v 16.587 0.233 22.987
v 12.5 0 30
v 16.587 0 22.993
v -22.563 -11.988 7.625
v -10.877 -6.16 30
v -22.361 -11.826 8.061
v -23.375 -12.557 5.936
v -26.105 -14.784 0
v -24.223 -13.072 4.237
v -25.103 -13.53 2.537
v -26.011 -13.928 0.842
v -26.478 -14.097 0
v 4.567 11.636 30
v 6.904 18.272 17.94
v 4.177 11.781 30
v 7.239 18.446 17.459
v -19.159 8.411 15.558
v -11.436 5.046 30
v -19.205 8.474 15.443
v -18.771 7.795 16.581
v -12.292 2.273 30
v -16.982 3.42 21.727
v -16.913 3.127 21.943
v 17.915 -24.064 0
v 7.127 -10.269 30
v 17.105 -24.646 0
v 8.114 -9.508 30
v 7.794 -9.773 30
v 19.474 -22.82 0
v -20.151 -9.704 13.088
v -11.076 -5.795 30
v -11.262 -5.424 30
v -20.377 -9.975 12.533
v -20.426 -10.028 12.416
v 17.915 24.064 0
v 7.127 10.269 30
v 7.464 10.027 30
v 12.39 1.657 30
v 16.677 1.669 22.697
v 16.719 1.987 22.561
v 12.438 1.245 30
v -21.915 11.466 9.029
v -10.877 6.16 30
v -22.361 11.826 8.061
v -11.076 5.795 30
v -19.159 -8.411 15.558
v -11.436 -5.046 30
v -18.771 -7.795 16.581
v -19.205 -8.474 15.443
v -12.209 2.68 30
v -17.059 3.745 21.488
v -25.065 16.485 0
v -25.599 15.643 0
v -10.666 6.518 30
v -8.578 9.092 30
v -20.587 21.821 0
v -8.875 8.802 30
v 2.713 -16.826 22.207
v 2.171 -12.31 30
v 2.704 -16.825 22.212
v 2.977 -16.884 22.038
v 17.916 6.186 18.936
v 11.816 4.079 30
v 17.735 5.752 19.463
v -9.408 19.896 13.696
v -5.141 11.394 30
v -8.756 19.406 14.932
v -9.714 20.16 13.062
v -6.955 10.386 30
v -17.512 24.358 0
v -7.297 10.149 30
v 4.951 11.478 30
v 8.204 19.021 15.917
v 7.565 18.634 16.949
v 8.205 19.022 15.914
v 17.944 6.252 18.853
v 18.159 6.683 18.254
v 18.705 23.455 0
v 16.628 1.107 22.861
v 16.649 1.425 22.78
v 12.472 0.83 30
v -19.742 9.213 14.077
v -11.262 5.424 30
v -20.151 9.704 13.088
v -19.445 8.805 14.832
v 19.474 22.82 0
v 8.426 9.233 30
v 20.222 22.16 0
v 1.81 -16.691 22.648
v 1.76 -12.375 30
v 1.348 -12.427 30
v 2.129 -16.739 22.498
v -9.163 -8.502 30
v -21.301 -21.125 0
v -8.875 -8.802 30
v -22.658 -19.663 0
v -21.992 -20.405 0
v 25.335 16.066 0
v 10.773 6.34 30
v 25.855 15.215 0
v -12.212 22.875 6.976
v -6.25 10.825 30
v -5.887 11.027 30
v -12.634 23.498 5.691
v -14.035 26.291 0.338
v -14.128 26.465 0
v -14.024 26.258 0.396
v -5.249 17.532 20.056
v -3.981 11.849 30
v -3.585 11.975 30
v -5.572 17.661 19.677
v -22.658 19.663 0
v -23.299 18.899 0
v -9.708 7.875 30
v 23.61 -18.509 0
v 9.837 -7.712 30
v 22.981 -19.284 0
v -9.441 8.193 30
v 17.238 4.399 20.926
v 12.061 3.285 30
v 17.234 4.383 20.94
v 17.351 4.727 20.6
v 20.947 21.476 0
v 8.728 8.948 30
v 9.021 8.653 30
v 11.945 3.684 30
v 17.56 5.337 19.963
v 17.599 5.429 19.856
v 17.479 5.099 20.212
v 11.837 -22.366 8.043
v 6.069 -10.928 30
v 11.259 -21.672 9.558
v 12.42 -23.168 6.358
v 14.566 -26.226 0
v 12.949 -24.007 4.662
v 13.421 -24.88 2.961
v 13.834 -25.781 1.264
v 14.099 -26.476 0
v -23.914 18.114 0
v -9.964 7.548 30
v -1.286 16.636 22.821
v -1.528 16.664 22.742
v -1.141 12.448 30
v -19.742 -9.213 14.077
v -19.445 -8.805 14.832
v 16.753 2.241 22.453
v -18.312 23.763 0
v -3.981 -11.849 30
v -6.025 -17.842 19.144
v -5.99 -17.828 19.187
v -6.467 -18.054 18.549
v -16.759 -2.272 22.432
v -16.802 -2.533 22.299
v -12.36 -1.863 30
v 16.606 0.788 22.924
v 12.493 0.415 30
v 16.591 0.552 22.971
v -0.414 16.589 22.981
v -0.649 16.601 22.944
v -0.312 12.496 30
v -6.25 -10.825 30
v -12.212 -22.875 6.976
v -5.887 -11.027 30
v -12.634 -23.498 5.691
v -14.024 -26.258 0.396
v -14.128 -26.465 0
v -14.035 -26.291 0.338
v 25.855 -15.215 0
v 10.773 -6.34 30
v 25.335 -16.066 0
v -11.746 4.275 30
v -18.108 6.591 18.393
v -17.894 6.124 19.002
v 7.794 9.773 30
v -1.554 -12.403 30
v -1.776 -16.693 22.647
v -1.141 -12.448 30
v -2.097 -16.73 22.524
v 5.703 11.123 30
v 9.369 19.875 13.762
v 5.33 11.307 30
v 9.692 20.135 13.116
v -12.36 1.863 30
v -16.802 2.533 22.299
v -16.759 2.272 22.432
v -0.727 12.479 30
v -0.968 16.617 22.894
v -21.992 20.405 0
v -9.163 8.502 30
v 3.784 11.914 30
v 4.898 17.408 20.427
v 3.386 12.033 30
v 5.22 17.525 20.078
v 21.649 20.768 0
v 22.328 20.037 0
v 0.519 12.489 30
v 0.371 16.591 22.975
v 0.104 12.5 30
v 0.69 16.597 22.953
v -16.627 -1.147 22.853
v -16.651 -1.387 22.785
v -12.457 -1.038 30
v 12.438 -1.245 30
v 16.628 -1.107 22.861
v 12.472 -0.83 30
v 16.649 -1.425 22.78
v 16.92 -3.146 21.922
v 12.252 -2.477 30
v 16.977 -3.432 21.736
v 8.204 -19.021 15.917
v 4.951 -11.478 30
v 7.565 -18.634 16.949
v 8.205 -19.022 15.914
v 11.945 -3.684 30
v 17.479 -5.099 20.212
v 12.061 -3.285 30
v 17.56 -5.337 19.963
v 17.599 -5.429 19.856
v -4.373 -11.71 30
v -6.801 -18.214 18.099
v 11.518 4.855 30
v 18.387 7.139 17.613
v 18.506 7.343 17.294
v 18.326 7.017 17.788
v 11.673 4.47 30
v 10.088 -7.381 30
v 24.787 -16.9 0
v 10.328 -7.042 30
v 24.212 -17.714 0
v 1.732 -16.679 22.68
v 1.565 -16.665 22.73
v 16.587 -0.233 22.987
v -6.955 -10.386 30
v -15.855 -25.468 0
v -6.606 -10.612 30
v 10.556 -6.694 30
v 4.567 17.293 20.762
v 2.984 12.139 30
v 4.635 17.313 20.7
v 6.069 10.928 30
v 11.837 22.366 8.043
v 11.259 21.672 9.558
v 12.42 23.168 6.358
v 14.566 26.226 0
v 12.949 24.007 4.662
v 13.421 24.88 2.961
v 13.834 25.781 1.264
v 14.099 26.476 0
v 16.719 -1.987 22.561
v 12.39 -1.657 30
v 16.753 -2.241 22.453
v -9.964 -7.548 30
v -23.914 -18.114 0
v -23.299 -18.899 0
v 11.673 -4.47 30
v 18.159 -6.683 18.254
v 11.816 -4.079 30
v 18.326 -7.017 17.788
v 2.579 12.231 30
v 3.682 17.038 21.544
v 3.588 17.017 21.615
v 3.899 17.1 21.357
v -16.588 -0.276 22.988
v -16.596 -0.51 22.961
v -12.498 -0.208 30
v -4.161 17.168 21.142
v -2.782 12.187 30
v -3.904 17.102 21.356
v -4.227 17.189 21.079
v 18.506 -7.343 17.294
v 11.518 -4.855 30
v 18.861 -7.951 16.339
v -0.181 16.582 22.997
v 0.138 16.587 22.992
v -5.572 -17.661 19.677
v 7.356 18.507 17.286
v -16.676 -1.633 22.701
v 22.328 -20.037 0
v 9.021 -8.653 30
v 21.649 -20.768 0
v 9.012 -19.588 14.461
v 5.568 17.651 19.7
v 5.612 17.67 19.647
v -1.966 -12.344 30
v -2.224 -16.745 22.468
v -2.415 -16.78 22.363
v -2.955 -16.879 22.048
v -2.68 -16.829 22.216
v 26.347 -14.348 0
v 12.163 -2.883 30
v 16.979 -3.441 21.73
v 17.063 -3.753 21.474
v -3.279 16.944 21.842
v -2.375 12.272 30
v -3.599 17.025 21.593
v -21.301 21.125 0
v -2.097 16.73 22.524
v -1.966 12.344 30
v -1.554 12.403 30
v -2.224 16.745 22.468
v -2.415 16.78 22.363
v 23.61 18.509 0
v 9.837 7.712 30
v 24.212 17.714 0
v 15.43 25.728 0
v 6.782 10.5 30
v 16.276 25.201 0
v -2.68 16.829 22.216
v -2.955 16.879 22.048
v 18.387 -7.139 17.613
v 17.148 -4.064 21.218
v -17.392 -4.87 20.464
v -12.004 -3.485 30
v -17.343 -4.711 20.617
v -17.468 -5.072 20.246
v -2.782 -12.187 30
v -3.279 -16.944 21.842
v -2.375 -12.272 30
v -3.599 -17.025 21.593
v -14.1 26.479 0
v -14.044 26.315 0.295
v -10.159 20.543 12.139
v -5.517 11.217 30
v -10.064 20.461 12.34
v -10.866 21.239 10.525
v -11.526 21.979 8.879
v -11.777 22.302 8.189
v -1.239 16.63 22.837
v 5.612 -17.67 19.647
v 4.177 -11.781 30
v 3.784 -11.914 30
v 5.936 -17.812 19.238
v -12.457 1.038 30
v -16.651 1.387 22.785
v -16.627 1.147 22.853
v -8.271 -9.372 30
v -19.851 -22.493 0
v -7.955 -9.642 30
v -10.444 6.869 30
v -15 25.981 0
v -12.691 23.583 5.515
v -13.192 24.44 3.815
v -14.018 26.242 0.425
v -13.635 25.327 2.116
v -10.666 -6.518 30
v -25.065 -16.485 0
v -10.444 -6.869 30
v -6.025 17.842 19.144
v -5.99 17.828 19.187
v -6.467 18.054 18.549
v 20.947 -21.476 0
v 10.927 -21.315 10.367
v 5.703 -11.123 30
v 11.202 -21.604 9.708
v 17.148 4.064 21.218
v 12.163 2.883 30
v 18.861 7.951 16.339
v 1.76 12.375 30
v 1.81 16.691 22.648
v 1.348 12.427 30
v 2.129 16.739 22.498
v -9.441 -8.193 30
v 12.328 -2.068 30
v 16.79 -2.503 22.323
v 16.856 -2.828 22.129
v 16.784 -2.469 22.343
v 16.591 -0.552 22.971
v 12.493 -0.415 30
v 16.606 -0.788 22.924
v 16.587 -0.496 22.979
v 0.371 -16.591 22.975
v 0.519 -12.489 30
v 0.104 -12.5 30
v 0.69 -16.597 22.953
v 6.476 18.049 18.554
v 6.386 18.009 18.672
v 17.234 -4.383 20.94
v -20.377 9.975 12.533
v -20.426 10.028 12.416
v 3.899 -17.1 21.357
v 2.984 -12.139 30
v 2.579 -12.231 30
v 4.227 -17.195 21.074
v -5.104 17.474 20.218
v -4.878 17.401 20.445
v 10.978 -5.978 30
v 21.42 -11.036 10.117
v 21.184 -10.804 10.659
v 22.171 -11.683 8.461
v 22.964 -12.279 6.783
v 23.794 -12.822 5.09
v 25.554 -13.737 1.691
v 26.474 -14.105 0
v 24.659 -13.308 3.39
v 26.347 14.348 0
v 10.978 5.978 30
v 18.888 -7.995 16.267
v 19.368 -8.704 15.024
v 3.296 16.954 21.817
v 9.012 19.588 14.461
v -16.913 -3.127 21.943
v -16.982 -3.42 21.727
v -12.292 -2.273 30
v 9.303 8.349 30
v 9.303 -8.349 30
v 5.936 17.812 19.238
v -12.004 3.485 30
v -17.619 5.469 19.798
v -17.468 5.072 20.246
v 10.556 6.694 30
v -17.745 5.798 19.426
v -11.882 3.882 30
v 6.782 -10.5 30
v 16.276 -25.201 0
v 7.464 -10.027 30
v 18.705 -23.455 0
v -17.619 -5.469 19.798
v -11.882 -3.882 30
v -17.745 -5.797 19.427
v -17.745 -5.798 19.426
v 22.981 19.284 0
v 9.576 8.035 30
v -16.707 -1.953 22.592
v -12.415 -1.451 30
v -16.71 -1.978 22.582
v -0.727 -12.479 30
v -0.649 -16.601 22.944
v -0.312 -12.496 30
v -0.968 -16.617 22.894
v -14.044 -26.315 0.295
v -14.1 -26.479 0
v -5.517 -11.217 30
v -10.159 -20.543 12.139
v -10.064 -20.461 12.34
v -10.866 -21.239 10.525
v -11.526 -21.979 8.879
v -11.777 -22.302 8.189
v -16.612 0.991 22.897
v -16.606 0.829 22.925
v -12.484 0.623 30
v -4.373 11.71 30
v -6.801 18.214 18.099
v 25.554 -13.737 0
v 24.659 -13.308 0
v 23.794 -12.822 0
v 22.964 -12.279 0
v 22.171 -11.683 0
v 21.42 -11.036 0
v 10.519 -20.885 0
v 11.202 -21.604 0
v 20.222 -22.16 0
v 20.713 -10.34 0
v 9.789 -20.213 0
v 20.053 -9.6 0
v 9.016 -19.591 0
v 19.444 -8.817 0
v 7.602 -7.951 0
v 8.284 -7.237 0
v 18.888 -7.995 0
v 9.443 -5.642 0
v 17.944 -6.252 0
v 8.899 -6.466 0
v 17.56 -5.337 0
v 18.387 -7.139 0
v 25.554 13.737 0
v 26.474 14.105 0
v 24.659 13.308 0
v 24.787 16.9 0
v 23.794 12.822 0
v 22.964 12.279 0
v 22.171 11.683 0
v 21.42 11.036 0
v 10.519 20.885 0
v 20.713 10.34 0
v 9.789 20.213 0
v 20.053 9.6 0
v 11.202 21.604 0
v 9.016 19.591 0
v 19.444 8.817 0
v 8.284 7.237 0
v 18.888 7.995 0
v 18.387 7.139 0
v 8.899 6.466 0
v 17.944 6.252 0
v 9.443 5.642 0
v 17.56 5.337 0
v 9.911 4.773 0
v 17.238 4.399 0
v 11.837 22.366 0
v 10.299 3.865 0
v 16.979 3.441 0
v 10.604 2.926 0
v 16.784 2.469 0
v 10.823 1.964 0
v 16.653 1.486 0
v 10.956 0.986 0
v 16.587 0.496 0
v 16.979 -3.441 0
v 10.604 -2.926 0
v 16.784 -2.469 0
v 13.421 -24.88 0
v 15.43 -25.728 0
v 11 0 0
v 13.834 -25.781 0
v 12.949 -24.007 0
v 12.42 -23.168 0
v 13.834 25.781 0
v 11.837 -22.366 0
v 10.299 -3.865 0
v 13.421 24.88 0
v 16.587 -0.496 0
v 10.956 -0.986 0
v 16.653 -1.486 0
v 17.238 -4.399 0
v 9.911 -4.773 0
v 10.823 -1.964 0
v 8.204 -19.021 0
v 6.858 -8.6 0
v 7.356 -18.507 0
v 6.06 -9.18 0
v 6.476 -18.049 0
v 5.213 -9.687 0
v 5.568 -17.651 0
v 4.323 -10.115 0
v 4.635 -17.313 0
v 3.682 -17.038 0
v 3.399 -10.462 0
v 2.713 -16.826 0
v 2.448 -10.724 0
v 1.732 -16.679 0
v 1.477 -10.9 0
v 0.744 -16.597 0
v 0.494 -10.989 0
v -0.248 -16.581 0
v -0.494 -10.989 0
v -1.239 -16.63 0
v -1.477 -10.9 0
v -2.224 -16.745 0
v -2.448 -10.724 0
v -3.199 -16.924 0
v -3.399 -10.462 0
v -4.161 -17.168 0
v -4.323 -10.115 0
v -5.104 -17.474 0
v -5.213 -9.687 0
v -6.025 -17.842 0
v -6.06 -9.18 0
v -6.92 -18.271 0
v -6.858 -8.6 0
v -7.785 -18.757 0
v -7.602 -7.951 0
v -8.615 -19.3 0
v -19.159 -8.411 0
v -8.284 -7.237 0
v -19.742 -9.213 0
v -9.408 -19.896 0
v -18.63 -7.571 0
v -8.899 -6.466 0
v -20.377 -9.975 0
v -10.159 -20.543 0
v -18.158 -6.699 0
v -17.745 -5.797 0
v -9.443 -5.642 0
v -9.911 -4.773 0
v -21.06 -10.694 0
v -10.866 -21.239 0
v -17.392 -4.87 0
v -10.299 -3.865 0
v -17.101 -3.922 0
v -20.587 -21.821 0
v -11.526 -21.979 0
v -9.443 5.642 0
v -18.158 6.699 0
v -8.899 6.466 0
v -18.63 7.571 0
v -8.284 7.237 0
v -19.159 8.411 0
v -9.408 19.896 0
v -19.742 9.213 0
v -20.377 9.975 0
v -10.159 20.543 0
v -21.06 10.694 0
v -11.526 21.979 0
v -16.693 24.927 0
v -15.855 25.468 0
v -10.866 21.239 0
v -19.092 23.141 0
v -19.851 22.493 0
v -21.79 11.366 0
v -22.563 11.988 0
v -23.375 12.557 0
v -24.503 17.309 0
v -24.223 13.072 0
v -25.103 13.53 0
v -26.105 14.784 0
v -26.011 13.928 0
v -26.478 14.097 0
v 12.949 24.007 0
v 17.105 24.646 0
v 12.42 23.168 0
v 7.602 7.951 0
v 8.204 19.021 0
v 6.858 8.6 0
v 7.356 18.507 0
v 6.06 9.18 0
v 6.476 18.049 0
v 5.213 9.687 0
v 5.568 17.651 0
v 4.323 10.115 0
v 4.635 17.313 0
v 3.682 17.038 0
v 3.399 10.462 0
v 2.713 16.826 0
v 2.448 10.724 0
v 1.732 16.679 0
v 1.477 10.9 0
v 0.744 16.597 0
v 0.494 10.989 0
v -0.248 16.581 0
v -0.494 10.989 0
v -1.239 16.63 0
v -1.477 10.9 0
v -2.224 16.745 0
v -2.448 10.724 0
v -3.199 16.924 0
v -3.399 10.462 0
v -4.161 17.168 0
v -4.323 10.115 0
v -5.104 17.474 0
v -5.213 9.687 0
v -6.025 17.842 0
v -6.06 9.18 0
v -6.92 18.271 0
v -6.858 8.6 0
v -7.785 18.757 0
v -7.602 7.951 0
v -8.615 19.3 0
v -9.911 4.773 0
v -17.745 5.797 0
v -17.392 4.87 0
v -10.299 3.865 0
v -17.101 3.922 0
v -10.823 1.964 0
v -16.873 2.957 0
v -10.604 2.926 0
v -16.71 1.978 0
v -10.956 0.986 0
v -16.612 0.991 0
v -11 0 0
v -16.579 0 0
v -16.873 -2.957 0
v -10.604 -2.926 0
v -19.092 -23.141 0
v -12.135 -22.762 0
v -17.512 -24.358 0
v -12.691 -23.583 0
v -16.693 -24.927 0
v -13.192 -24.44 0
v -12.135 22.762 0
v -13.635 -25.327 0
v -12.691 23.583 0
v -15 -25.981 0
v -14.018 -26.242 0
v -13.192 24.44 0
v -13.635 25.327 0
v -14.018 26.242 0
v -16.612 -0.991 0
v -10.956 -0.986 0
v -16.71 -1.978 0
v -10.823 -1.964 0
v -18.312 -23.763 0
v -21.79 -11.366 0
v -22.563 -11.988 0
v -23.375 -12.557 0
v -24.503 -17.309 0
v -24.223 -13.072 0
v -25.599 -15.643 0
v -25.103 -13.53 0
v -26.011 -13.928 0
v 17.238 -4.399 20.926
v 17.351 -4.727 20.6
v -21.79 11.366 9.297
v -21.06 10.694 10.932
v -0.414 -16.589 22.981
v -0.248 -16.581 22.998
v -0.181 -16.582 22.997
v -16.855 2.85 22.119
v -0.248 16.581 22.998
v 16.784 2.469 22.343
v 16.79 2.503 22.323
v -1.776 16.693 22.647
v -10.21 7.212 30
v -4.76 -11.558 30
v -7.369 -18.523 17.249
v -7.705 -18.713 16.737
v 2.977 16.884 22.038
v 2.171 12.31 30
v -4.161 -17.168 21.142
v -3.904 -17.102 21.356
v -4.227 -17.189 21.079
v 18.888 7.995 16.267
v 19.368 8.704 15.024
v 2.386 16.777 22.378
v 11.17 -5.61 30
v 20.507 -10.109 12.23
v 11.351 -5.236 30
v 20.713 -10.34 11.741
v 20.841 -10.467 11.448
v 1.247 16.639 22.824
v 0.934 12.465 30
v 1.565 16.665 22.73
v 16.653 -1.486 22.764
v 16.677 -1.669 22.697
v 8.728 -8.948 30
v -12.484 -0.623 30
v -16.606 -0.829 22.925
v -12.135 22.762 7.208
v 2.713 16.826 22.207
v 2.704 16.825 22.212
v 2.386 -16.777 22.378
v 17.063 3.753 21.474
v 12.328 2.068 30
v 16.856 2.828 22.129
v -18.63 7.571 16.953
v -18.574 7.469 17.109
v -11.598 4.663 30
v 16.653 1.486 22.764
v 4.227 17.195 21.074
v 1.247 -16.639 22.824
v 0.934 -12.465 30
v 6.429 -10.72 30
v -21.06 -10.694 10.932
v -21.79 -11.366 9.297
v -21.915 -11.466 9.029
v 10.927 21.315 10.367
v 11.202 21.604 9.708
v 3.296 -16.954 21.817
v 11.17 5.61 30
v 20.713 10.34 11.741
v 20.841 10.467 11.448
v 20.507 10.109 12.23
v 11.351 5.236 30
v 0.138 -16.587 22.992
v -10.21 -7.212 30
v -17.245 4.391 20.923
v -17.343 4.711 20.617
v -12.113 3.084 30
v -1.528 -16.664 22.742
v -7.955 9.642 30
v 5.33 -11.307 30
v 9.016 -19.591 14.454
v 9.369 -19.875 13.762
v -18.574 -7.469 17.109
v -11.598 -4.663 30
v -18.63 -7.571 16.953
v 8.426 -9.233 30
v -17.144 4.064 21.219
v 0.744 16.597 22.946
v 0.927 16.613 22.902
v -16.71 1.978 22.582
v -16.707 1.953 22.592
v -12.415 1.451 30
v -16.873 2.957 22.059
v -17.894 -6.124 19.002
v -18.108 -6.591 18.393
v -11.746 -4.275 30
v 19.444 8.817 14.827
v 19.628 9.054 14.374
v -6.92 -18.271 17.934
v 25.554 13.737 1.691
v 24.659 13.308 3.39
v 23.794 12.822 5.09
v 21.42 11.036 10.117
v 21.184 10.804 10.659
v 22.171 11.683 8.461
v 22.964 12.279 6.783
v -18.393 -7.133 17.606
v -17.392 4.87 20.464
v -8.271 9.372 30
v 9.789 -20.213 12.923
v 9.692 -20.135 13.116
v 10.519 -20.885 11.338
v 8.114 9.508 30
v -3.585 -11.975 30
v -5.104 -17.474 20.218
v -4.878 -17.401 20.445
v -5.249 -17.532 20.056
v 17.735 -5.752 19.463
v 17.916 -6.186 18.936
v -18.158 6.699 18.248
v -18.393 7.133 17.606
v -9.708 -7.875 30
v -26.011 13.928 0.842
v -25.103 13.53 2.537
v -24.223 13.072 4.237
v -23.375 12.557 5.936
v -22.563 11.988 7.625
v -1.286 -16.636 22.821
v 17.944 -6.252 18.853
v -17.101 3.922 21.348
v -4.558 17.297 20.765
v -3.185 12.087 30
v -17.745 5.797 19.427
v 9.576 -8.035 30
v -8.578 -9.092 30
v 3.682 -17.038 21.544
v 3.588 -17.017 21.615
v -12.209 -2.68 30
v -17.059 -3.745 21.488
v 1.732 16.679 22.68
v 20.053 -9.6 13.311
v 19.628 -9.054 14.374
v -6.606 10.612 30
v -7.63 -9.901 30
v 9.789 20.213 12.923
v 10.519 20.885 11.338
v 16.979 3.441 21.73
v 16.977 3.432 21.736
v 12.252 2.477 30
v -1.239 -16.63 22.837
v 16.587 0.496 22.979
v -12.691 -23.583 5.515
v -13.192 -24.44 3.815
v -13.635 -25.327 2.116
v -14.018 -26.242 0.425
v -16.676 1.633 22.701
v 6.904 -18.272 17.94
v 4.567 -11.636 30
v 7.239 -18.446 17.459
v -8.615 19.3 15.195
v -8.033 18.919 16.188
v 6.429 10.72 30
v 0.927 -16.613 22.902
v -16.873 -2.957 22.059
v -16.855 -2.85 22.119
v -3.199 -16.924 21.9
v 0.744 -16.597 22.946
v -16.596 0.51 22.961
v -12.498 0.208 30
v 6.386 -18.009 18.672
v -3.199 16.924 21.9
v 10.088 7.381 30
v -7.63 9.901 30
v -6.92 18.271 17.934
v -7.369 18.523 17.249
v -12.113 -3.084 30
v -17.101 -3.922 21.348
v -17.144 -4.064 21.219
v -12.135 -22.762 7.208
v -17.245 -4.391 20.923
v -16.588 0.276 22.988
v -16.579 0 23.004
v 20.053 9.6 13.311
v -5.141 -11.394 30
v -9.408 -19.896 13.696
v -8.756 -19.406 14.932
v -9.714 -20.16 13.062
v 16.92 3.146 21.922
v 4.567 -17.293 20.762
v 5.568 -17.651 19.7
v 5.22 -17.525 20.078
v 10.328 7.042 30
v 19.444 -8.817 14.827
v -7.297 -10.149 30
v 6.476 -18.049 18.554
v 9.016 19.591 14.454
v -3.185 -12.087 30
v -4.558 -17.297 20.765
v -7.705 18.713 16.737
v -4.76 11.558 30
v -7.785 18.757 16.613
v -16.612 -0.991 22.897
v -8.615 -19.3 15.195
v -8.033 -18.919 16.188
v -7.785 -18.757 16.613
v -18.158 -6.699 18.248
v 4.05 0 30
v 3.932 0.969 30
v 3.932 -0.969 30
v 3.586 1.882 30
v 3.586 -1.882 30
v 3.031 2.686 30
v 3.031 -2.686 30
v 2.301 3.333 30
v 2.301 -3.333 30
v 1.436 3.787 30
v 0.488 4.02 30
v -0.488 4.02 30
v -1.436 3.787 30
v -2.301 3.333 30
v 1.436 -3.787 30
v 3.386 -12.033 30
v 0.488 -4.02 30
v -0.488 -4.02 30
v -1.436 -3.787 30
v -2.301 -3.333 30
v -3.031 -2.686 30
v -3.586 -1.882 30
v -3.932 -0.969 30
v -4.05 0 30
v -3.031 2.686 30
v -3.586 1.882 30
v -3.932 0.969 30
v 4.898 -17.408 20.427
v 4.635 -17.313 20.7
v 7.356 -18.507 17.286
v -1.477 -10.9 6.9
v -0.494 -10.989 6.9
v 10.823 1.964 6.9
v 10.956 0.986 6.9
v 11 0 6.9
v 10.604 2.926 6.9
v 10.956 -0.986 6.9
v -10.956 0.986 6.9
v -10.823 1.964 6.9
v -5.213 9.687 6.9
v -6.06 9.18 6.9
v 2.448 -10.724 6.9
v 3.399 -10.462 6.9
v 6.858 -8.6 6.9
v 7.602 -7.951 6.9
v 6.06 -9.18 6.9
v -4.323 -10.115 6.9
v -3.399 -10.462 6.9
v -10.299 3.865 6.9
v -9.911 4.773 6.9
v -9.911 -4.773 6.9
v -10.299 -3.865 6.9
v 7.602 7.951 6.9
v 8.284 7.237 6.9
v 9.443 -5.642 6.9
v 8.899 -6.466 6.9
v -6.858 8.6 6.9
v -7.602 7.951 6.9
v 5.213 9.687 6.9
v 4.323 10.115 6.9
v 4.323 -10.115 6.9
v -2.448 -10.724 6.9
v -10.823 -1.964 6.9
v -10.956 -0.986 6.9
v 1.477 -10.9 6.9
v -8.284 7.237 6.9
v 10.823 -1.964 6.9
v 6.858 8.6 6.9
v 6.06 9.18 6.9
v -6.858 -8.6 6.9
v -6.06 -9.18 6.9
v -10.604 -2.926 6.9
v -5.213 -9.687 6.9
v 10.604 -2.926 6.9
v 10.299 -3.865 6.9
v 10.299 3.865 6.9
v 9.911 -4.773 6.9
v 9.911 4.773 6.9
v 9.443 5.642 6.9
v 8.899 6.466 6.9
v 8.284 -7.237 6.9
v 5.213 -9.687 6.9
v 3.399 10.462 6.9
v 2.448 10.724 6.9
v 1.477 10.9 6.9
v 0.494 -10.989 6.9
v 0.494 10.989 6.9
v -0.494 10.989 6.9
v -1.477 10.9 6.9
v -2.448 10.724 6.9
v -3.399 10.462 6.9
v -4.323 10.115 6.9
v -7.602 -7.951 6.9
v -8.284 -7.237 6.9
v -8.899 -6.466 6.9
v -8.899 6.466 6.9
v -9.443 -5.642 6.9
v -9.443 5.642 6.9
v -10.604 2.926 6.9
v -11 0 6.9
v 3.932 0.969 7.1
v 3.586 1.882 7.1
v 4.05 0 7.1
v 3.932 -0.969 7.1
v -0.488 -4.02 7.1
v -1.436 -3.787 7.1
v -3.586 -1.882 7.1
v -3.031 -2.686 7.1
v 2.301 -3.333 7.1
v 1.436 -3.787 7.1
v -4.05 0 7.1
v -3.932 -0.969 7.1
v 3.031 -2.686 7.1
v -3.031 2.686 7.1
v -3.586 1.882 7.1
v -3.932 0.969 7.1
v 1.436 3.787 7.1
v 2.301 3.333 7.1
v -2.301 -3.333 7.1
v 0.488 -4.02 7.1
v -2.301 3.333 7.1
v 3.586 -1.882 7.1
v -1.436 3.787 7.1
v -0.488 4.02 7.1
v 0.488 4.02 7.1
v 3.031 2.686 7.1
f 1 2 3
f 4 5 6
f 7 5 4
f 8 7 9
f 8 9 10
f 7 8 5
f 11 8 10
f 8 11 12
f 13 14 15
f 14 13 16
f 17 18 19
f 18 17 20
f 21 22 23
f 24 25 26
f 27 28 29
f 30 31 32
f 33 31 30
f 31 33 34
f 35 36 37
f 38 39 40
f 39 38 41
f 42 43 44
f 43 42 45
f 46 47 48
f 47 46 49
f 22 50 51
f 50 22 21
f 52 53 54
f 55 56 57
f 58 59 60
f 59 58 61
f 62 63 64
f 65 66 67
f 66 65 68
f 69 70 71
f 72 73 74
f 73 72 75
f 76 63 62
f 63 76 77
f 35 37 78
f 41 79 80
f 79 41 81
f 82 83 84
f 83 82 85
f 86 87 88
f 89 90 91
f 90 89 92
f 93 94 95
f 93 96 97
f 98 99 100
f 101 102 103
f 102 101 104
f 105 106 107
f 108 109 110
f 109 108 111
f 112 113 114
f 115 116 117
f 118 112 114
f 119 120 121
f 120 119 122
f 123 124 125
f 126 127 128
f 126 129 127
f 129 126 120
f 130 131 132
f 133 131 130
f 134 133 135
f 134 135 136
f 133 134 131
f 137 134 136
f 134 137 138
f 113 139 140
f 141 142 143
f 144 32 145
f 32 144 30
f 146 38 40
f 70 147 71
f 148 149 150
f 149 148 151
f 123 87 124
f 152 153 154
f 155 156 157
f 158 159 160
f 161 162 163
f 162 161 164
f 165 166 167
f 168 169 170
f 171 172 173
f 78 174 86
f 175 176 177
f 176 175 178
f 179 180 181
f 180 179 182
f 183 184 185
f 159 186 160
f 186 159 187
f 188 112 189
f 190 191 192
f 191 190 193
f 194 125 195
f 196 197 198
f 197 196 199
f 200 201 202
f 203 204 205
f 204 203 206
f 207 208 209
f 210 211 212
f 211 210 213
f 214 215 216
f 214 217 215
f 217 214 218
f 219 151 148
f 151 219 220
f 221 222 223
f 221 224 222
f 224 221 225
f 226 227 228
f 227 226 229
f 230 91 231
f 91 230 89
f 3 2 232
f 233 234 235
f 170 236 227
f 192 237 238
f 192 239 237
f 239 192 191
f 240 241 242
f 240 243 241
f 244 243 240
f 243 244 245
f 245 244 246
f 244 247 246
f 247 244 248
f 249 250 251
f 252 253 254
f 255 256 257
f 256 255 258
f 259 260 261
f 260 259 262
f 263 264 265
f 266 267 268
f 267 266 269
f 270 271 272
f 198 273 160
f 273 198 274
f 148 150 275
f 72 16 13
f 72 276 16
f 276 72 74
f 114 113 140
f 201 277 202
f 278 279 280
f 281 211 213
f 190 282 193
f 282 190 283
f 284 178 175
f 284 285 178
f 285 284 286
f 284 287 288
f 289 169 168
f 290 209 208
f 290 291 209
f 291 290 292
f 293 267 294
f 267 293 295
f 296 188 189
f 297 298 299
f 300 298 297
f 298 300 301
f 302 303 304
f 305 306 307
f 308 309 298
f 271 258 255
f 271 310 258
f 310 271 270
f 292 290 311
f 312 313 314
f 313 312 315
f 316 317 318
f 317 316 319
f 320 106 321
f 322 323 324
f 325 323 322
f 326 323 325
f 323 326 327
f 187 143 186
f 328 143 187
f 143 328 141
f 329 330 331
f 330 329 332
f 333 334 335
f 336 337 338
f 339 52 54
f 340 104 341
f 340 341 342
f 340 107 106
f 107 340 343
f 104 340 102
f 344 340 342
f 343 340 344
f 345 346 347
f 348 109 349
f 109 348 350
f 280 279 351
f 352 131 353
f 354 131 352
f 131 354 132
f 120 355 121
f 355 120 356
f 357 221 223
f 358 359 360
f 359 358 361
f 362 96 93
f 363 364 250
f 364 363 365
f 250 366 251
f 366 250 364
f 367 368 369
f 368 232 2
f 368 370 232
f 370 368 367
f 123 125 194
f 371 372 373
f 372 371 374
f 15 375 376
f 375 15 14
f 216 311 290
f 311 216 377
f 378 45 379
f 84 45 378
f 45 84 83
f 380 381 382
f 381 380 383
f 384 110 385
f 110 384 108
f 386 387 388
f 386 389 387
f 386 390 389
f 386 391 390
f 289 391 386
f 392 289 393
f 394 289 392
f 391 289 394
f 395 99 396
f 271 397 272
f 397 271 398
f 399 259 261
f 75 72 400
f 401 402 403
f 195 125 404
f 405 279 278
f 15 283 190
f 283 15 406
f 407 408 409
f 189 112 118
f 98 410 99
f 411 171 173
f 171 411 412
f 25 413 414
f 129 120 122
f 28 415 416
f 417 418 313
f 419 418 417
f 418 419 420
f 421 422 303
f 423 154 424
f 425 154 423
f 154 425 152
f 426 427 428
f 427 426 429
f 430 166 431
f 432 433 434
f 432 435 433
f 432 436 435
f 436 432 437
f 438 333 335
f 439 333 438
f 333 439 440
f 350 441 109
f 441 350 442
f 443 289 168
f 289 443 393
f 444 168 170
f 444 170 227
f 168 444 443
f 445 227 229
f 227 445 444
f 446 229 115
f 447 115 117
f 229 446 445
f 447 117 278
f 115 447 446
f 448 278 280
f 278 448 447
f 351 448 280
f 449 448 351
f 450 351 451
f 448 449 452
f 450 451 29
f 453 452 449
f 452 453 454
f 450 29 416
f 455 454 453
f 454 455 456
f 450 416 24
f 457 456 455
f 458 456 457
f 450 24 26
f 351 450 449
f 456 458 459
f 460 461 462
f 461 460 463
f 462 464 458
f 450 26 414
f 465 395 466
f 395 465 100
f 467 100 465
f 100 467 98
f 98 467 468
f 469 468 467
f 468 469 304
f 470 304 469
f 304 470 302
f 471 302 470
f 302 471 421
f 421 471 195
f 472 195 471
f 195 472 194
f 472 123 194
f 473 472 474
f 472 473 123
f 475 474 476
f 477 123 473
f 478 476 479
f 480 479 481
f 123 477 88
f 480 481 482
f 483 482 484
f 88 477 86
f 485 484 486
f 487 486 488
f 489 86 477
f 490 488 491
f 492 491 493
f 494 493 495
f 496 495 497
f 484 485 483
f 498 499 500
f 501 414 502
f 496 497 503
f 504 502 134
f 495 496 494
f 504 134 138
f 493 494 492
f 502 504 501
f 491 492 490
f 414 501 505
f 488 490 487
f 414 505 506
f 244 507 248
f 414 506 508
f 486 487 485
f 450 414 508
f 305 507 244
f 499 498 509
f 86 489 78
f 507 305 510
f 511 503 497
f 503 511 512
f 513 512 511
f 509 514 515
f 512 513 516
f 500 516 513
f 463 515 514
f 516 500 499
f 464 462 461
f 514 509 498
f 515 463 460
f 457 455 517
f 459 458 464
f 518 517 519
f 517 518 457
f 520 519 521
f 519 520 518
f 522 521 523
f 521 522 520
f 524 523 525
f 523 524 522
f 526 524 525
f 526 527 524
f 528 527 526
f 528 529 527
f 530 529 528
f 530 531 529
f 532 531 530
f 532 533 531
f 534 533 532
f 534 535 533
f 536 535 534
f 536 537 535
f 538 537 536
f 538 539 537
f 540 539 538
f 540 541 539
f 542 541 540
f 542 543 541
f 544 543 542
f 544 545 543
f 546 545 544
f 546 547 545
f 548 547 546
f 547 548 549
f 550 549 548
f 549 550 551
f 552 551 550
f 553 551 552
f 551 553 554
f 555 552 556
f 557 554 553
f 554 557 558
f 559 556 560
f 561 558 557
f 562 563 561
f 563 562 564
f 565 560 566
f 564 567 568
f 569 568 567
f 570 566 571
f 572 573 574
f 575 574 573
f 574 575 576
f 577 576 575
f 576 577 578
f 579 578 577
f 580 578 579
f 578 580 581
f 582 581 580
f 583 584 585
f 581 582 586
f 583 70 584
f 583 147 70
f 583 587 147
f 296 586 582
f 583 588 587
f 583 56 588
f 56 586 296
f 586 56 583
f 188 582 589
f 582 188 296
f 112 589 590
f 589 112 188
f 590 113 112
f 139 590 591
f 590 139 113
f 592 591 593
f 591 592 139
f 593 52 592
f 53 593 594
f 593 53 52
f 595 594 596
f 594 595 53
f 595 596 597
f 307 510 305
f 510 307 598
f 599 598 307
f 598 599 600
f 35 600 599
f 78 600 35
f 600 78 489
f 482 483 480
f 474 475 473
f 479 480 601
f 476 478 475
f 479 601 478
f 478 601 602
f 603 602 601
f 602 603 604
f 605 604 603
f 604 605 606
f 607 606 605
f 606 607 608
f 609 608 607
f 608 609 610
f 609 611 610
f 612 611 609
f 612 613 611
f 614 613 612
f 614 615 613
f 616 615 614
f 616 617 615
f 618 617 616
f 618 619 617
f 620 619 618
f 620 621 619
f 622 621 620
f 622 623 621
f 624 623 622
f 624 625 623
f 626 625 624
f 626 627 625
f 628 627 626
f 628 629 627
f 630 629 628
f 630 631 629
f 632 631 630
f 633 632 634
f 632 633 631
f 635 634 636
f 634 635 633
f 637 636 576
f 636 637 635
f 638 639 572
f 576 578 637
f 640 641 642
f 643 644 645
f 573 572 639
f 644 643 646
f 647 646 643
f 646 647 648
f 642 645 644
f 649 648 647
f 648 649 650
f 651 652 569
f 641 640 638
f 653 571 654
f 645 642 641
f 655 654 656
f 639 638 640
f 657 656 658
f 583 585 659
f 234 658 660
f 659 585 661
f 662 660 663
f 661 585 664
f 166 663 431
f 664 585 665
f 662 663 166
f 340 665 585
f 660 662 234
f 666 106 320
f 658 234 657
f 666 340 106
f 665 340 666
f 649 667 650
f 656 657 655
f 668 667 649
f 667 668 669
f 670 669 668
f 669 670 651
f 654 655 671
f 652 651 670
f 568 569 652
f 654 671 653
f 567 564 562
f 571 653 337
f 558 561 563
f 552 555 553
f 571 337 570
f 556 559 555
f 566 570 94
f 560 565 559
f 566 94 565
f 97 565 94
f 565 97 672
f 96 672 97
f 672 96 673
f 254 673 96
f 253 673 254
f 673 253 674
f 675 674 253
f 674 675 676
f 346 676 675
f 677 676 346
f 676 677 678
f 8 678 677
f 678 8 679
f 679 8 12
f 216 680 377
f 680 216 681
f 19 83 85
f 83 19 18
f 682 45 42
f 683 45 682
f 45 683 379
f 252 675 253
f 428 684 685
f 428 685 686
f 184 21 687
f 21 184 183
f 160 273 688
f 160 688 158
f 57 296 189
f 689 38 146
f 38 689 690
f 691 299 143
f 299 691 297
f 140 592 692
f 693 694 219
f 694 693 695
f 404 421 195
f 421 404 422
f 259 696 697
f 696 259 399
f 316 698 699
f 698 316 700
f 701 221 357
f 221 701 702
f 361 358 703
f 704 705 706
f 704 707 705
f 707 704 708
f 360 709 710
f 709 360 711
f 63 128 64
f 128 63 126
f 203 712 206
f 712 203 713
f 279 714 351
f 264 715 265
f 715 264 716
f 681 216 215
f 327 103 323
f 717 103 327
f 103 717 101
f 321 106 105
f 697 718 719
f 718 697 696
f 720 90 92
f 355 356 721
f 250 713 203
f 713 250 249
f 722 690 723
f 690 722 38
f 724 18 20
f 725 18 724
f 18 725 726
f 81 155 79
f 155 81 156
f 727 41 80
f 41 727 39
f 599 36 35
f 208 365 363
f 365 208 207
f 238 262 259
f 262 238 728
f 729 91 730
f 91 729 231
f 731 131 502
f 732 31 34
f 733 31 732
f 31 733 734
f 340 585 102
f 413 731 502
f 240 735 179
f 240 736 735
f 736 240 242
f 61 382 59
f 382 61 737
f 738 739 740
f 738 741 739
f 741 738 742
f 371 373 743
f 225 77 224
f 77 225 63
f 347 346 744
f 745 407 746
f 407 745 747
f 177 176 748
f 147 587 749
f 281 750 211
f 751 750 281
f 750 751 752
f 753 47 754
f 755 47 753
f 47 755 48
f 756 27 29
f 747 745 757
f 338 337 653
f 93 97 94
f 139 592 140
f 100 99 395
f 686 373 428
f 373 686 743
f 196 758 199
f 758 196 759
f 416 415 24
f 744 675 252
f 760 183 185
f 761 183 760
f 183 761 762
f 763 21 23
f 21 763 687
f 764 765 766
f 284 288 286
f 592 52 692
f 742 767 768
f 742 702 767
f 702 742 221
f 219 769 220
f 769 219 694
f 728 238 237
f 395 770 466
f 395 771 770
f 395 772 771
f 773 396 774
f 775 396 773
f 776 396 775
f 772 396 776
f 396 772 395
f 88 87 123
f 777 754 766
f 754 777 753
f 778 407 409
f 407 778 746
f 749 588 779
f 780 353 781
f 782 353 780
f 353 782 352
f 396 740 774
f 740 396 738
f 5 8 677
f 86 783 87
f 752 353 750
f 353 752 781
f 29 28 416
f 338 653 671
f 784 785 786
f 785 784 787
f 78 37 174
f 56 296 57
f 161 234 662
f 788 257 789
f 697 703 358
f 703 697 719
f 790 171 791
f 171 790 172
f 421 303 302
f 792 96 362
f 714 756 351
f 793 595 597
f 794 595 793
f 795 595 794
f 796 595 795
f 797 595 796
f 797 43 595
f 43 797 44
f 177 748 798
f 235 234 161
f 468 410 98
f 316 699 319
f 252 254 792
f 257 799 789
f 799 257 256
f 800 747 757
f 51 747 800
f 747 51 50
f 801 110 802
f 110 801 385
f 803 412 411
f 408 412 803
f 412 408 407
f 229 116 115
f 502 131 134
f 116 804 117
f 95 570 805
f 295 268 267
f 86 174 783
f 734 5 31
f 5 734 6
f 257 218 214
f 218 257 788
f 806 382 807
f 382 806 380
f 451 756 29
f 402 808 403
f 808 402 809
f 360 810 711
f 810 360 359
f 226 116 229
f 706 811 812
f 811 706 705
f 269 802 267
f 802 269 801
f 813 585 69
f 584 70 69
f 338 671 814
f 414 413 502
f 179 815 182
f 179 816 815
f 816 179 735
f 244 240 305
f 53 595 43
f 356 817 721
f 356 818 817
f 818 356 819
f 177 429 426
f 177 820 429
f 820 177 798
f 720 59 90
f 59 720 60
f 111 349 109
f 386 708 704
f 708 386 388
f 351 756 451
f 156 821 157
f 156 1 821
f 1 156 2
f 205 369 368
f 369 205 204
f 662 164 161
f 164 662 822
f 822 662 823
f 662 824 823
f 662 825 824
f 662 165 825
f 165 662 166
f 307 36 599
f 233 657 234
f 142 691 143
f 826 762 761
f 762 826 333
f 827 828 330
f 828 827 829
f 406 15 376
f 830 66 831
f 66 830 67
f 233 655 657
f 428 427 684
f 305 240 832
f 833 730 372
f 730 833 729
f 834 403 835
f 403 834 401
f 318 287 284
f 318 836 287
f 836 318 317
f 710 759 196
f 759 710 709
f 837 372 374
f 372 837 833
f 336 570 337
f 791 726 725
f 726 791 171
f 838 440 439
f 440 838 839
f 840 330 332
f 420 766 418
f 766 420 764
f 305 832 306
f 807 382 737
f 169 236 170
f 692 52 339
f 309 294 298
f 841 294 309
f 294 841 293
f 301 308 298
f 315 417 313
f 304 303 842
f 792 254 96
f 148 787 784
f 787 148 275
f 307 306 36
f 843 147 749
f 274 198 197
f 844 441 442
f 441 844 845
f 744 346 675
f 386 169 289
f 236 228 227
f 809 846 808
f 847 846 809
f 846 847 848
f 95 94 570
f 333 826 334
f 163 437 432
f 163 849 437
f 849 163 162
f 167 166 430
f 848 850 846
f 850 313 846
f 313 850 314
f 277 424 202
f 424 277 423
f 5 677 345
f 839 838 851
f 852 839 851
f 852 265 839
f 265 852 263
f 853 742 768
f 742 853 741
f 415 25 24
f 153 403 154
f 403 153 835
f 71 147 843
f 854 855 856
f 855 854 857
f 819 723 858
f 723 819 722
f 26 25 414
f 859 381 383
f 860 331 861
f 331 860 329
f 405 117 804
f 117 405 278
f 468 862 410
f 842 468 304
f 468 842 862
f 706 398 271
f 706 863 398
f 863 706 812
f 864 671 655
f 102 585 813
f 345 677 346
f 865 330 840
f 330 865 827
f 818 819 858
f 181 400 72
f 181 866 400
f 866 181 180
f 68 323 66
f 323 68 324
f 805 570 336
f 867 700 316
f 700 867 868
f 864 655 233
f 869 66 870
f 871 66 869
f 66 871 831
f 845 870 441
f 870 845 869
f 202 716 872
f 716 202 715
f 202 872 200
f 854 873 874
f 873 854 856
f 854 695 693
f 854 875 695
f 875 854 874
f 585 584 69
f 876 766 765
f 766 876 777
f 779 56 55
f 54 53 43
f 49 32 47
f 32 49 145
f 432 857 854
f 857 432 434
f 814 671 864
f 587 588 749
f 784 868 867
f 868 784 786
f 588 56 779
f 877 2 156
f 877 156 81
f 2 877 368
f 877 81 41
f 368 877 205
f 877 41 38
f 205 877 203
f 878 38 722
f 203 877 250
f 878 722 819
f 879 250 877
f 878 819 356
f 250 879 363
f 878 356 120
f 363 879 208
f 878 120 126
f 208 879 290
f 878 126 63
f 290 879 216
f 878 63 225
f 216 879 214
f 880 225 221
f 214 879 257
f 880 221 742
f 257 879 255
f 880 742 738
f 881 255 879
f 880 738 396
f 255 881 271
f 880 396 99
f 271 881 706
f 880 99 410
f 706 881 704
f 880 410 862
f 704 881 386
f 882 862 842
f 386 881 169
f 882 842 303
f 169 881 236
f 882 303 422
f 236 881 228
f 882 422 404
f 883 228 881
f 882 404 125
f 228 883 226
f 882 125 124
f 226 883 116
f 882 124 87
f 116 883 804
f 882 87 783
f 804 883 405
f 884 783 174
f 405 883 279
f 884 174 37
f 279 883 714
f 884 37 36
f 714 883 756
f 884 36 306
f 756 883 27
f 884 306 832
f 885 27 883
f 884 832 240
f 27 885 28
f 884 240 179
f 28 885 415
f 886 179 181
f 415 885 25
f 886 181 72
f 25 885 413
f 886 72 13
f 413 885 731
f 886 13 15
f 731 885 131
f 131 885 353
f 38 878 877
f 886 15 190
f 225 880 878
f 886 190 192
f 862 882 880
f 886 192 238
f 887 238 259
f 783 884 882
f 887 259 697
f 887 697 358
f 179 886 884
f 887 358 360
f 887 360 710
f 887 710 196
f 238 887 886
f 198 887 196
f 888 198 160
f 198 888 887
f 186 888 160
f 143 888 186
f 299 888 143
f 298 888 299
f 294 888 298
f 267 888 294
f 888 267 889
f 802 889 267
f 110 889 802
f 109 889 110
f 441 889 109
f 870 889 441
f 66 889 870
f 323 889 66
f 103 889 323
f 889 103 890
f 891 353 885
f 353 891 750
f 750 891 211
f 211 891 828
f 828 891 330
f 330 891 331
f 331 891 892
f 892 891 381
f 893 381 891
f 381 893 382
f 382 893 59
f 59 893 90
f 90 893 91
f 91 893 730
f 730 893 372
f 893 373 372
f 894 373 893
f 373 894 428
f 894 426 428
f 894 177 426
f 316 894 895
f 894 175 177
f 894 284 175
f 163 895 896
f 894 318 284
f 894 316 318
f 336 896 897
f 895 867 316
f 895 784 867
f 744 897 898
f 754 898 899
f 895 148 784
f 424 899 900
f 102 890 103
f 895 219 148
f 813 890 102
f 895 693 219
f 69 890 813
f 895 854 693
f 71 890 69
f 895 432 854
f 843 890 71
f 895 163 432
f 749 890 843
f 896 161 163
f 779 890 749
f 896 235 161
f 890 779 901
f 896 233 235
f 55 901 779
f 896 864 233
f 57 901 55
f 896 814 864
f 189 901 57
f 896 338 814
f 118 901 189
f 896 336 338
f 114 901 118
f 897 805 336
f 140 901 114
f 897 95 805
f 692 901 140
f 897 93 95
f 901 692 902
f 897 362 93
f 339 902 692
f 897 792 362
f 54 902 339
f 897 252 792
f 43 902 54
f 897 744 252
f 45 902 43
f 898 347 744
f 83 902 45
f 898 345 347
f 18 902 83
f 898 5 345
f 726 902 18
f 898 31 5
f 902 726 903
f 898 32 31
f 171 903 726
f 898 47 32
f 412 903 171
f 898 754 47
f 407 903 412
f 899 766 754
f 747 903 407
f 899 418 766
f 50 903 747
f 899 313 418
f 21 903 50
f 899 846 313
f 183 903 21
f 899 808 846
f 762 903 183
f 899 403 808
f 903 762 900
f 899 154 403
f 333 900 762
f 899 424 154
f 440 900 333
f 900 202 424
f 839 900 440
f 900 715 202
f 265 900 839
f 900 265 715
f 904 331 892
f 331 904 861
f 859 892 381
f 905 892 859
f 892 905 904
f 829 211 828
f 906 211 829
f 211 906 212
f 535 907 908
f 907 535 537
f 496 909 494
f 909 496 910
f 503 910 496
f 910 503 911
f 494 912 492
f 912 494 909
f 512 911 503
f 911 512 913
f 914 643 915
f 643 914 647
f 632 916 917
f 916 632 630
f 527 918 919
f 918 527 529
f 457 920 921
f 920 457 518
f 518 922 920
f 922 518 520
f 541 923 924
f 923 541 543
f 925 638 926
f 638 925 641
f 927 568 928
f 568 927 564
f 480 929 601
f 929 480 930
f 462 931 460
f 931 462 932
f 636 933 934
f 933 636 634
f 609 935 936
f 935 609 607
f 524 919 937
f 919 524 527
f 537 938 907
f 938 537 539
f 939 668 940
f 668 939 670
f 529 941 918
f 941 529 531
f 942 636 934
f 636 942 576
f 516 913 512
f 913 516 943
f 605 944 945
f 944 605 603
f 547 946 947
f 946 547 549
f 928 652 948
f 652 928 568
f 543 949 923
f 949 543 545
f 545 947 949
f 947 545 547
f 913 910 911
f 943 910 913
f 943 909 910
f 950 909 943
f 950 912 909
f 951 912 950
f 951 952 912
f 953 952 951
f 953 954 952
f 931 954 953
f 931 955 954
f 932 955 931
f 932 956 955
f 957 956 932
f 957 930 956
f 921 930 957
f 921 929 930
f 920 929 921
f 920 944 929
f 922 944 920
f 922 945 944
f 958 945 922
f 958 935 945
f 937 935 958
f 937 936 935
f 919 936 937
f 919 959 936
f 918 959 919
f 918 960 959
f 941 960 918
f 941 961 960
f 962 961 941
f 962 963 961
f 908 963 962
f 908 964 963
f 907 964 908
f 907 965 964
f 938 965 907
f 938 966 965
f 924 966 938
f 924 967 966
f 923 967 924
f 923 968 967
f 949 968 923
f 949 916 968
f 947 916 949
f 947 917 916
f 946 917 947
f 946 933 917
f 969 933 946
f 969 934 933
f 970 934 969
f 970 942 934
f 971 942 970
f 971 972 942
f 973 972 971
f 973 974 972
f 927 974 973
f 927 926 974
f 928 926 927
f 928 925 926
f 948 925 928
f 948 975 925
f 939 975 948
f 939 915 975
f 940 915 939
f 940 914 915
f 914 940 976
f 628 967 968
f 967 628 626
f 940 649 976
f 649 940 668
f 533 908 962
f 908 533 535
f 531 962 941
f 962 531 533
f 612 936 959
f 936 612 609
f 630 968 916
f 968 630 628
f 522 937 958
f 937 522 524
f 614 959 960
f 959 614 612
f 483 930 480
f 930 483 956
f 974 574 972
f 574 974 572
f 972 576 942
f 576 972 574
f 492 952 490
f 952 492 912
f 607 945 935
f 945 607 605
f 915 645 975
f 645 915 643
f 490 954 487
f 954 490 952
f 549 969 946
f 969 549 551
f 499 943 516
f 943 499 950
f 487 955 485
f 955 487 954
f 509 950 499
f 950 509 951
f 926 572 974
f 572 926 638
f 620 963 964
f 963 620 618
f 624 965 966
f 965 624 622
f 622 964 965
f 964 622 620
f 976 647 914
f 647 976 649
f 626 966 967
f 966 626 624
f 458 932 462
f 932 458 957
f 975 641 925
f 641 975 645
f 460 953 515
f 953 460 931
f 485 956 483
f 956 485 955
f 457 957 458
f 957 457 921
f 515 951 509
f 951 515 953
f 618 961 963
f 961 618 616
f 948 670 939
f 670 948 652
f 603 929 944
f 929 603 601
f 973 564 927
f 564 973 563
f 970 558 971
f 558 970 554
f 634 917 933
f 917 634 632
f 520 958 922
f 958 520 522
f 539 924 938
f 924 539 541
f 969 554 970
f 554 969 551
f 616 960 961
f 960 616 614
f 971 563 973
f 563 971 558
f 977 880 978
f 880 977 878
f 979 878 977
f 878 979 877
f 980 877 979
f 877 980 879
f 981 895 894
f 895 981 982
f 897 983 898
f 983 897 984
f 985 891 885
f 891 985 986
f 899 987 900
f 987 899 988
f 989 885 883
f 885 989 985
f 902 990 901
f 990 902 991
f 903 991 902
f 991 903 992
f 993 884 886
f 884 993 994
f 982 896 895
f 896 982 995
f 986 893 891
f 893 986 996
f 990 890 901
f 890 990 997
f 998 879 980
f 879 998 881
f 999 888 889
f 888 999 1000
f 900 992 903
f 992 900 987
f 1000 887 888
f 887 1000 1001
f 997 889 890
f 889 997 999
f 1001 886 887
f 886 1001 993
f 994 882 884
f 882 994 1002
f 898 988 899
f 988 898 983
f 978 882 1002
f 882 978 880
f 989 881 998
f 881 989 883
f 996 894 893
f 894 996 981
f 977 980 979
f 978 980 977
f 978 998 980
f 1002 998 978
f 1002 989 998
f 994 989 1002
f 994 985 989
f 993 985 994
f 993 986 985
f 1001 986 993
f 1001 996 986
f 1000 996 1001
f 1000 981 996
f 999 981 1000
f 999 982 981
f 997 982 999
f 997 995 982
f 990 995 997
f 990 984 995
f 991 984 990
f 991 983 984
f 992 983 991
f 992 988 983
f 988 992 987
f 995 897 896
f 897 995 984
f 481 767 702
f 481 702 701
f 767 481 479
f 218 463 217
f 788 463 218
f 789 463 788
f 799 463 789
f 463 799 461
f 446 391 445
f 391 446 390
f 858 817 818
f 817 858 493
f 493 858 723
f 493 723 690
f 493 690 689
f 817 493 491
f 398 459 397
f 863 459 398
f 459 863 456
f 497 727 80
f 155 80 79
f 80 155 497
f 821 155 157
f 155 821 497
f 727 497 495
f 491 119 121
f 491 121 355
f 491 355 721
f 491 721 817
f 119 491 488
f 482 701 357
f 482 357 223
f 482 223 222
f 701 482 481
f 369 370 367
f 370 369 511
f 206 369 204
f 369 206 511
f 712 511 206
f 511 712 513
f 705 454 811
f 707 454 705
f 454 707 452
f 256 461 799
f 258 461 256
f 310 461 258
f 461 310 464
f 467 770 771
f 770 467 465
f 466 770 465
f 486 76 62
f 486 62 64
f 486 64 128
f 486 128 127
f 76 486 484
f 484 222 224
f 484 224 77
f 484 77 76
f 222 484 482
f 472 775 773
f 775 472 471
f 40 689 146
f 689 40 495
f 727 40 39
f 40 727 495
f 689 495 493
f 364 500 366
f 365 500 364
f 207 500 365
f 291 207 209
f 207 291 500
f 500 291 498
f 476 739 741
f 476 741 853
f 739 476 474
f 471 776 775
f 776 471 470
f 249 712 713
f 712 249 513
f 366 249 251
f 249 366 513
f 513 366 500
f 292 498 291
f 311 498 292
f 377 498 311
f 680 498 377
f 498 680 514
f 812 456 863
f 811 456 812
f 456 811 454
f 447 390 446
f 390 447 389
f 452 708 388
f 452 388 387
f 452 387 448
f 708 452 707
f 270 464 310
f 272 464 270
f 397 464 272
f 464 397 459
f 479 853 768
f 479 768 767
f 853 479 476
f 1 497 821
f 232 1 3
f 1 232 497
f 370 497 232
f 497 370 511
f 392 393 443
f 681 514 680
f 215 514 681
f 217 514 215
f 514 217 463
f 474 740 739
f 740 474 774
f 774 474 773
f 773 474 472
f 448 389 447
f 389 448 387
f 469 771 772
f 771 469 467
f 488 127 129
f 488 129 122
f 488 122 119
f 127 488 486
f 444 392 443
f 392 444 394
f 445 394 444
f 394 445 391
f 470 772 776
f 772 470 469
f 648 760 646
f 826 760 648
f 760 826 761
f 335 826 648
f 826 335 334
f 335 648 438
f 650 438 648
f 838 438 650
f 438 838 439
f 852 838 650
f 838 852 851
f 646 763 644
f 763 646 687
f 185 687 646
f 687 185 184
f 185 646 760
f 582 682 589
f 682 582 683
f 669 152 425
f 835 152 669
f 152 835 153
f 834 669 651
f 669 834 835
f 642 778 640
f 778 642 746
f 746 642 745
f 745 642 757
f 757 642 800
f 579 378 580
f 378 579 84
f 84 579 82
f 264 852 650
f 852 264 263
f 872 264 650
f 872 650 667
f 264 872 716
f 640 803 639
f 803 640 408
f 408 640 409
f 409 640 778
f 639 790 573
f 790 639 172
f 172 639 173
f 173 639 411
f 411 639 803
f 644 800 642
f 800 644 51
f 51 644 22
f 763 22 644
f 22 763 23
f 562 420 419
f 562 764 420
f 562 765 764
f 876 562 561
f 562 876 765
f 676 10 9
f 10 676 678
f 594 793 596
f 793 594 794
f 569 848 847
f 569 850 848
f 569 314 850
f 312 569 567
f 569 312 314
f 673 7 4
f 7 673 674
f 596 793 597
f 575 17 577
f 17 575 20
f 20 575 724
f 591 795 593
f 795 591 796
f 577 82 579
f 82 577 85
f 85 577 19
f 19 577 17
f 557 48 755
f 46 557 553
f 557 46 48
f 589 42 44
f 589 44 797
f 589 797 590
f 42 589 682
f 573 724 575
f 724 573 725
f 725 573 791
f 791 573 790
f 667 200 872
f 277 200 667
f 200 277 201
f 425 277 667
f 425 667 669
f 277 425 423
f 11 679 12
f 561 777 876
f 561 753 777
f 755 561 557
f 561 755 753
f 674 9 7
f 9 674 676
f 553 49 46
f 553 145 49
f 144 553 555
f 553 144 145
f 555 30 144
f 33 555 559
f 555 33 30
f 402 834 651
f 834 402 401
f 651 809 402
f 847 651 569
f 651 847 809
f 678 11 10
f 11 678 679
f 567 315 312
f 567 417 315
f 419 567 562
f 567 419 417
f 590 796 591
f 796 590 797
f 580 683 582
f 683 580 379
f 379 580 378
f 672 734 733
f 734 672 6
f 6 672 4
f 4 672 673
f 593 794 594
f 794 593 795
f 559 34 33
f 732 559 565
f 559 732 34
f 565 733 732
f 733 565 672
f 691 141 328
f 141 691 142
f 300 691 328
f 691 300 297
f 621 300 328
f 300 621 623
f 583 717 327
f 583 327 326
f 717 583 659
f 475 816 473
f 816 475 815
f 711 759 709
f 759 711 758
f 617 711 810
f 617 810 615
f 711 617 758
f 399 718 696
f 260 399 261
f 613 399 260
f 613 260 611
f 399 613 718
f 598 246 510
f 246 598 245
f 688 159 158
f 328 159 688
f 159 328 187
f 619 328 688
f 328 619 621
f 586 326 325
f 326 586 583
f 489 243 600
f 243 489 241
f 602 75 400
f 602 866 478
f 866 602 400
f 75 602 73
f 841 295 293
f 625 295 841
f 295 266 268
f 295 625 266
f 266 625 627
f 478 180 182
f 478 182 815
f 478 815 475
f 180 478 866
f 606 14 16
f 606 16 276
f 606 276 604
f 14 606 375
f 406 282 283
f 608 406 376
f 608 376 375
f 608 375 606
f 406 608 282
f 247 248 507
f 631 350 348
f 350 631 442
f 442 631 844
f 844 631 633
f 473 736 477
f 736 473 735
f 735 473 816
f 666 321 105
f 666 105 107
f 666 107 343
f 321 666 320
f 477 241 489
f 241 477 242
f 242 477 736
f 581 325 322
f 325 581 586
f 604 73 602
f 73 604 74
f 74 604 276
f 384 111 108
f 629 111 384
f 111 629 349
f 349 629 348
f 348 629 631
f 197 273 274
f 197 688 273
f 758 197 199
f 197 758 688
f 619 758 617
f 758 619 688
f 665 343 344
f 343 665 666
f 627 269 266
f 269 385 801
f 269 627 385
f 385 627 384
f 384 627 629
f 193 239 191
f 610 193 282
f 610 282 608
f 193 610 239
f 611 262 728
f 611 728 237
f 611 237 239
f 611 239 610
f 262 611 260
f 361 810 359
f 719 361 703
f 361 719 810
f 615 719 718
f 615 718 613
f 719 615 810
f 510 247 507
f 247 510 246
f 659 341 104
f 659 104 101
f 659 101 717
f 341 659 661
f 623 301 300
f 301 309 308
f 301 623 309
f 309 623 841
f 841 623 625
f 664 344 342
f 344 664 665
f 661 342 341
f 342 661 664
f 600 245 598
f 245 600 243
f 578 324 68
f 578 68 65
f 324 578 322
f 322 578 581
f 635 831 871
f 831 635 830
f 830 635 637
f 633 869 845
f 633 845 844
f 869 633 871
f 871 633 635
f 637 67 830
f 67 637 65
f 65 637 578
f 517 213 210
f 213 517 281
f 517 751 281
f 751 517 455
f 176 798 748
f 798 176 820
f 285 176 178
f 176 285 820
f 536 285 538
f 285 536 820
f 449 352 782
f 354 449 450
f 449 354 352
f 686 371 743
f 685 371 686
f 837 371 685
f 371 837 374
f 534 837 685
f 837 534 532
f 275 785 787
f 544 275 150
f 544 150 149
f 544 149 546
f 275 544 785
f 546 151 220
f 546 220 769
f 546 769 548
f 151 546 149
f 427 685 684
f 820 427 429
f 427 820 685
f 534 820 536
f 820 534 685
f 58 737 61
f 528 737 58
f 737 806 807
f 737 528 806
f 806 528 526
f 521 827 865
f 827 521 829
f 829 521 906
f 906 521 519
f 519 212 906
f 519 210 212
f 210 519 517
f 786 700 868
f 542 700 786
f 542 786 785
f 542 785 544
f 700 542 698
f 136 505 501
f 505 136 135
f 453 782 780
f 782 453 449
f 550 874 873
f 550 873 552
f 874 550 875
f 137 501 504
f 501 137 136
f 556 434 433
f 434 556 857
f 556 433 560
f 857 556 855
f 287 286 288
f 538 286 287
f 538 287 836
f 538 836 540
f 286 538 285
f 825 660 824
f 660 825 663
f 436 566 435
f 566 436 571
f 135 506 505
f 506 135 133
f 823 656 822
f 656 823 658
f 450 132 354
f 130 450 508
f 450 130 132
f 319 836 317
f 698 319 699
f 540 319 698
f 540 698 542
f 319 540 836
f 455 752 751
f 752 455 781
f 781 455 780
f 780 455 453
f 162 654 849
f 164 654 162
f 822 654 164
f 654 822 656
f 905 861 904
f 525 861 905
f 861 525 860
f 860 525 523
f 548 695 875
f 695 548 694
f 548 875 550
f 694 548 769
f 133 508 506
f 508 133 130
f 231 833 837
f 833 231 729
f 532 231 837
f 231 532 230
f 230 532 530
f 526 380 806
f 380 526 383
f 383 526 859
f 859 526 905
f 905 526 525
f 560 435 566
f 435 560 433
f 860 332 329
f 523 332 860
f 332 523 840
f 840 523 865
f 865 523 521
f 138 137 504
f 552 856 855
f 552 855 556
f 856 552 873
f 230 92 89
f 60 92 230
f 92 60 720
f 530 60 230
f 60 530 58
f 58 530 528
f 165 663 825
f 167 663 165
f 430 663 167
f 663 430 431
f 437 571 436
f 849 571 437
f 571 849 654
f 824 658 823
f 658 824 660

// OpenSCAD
// bearing dimentions
bearing_d = 22;
bearing_h = 7;

// max and min size of the spool holder diameter
max_d = 60;
min_d = 25;

// height of the holder
cone_h = 30;

// rod diameter
rod_d = 8.1;


// circle control
$fa = 1;
$fs = 1;


difference(){
// cone
	translate([0,0,cone_h/2])cylinder(r1 = max_d/2, r2 = min_d/2, h = cone_h, center=true);

// cutout for the bearing
	translate([0,0,bearing_h/2-.1]) cylinder(r=bearing_d/2, h=bearing_h, center=true);
	
// the center rod 
	translate([0,0,max_d/2+bearing_h+.1]) cylinder(r=rod_d/2, h=max_d, center=true);
	
// material saving cutout
   translate([max_d/1.9, 0,0]) cylinder(r=max_d/4, h=max_d, center=true);
    translate([-max_d/1.9, 0,0]) cylinder(r=max_d/4, h=max_d, center=true);
    translate([0,max_d/1.9, 0]) cylinder(r=max_d/4, h=max_d, center=true);
    translate([0,-max_d/1.9,0]) cylinder(r=max_d/4, h=max_d, center=true);	
  
}
